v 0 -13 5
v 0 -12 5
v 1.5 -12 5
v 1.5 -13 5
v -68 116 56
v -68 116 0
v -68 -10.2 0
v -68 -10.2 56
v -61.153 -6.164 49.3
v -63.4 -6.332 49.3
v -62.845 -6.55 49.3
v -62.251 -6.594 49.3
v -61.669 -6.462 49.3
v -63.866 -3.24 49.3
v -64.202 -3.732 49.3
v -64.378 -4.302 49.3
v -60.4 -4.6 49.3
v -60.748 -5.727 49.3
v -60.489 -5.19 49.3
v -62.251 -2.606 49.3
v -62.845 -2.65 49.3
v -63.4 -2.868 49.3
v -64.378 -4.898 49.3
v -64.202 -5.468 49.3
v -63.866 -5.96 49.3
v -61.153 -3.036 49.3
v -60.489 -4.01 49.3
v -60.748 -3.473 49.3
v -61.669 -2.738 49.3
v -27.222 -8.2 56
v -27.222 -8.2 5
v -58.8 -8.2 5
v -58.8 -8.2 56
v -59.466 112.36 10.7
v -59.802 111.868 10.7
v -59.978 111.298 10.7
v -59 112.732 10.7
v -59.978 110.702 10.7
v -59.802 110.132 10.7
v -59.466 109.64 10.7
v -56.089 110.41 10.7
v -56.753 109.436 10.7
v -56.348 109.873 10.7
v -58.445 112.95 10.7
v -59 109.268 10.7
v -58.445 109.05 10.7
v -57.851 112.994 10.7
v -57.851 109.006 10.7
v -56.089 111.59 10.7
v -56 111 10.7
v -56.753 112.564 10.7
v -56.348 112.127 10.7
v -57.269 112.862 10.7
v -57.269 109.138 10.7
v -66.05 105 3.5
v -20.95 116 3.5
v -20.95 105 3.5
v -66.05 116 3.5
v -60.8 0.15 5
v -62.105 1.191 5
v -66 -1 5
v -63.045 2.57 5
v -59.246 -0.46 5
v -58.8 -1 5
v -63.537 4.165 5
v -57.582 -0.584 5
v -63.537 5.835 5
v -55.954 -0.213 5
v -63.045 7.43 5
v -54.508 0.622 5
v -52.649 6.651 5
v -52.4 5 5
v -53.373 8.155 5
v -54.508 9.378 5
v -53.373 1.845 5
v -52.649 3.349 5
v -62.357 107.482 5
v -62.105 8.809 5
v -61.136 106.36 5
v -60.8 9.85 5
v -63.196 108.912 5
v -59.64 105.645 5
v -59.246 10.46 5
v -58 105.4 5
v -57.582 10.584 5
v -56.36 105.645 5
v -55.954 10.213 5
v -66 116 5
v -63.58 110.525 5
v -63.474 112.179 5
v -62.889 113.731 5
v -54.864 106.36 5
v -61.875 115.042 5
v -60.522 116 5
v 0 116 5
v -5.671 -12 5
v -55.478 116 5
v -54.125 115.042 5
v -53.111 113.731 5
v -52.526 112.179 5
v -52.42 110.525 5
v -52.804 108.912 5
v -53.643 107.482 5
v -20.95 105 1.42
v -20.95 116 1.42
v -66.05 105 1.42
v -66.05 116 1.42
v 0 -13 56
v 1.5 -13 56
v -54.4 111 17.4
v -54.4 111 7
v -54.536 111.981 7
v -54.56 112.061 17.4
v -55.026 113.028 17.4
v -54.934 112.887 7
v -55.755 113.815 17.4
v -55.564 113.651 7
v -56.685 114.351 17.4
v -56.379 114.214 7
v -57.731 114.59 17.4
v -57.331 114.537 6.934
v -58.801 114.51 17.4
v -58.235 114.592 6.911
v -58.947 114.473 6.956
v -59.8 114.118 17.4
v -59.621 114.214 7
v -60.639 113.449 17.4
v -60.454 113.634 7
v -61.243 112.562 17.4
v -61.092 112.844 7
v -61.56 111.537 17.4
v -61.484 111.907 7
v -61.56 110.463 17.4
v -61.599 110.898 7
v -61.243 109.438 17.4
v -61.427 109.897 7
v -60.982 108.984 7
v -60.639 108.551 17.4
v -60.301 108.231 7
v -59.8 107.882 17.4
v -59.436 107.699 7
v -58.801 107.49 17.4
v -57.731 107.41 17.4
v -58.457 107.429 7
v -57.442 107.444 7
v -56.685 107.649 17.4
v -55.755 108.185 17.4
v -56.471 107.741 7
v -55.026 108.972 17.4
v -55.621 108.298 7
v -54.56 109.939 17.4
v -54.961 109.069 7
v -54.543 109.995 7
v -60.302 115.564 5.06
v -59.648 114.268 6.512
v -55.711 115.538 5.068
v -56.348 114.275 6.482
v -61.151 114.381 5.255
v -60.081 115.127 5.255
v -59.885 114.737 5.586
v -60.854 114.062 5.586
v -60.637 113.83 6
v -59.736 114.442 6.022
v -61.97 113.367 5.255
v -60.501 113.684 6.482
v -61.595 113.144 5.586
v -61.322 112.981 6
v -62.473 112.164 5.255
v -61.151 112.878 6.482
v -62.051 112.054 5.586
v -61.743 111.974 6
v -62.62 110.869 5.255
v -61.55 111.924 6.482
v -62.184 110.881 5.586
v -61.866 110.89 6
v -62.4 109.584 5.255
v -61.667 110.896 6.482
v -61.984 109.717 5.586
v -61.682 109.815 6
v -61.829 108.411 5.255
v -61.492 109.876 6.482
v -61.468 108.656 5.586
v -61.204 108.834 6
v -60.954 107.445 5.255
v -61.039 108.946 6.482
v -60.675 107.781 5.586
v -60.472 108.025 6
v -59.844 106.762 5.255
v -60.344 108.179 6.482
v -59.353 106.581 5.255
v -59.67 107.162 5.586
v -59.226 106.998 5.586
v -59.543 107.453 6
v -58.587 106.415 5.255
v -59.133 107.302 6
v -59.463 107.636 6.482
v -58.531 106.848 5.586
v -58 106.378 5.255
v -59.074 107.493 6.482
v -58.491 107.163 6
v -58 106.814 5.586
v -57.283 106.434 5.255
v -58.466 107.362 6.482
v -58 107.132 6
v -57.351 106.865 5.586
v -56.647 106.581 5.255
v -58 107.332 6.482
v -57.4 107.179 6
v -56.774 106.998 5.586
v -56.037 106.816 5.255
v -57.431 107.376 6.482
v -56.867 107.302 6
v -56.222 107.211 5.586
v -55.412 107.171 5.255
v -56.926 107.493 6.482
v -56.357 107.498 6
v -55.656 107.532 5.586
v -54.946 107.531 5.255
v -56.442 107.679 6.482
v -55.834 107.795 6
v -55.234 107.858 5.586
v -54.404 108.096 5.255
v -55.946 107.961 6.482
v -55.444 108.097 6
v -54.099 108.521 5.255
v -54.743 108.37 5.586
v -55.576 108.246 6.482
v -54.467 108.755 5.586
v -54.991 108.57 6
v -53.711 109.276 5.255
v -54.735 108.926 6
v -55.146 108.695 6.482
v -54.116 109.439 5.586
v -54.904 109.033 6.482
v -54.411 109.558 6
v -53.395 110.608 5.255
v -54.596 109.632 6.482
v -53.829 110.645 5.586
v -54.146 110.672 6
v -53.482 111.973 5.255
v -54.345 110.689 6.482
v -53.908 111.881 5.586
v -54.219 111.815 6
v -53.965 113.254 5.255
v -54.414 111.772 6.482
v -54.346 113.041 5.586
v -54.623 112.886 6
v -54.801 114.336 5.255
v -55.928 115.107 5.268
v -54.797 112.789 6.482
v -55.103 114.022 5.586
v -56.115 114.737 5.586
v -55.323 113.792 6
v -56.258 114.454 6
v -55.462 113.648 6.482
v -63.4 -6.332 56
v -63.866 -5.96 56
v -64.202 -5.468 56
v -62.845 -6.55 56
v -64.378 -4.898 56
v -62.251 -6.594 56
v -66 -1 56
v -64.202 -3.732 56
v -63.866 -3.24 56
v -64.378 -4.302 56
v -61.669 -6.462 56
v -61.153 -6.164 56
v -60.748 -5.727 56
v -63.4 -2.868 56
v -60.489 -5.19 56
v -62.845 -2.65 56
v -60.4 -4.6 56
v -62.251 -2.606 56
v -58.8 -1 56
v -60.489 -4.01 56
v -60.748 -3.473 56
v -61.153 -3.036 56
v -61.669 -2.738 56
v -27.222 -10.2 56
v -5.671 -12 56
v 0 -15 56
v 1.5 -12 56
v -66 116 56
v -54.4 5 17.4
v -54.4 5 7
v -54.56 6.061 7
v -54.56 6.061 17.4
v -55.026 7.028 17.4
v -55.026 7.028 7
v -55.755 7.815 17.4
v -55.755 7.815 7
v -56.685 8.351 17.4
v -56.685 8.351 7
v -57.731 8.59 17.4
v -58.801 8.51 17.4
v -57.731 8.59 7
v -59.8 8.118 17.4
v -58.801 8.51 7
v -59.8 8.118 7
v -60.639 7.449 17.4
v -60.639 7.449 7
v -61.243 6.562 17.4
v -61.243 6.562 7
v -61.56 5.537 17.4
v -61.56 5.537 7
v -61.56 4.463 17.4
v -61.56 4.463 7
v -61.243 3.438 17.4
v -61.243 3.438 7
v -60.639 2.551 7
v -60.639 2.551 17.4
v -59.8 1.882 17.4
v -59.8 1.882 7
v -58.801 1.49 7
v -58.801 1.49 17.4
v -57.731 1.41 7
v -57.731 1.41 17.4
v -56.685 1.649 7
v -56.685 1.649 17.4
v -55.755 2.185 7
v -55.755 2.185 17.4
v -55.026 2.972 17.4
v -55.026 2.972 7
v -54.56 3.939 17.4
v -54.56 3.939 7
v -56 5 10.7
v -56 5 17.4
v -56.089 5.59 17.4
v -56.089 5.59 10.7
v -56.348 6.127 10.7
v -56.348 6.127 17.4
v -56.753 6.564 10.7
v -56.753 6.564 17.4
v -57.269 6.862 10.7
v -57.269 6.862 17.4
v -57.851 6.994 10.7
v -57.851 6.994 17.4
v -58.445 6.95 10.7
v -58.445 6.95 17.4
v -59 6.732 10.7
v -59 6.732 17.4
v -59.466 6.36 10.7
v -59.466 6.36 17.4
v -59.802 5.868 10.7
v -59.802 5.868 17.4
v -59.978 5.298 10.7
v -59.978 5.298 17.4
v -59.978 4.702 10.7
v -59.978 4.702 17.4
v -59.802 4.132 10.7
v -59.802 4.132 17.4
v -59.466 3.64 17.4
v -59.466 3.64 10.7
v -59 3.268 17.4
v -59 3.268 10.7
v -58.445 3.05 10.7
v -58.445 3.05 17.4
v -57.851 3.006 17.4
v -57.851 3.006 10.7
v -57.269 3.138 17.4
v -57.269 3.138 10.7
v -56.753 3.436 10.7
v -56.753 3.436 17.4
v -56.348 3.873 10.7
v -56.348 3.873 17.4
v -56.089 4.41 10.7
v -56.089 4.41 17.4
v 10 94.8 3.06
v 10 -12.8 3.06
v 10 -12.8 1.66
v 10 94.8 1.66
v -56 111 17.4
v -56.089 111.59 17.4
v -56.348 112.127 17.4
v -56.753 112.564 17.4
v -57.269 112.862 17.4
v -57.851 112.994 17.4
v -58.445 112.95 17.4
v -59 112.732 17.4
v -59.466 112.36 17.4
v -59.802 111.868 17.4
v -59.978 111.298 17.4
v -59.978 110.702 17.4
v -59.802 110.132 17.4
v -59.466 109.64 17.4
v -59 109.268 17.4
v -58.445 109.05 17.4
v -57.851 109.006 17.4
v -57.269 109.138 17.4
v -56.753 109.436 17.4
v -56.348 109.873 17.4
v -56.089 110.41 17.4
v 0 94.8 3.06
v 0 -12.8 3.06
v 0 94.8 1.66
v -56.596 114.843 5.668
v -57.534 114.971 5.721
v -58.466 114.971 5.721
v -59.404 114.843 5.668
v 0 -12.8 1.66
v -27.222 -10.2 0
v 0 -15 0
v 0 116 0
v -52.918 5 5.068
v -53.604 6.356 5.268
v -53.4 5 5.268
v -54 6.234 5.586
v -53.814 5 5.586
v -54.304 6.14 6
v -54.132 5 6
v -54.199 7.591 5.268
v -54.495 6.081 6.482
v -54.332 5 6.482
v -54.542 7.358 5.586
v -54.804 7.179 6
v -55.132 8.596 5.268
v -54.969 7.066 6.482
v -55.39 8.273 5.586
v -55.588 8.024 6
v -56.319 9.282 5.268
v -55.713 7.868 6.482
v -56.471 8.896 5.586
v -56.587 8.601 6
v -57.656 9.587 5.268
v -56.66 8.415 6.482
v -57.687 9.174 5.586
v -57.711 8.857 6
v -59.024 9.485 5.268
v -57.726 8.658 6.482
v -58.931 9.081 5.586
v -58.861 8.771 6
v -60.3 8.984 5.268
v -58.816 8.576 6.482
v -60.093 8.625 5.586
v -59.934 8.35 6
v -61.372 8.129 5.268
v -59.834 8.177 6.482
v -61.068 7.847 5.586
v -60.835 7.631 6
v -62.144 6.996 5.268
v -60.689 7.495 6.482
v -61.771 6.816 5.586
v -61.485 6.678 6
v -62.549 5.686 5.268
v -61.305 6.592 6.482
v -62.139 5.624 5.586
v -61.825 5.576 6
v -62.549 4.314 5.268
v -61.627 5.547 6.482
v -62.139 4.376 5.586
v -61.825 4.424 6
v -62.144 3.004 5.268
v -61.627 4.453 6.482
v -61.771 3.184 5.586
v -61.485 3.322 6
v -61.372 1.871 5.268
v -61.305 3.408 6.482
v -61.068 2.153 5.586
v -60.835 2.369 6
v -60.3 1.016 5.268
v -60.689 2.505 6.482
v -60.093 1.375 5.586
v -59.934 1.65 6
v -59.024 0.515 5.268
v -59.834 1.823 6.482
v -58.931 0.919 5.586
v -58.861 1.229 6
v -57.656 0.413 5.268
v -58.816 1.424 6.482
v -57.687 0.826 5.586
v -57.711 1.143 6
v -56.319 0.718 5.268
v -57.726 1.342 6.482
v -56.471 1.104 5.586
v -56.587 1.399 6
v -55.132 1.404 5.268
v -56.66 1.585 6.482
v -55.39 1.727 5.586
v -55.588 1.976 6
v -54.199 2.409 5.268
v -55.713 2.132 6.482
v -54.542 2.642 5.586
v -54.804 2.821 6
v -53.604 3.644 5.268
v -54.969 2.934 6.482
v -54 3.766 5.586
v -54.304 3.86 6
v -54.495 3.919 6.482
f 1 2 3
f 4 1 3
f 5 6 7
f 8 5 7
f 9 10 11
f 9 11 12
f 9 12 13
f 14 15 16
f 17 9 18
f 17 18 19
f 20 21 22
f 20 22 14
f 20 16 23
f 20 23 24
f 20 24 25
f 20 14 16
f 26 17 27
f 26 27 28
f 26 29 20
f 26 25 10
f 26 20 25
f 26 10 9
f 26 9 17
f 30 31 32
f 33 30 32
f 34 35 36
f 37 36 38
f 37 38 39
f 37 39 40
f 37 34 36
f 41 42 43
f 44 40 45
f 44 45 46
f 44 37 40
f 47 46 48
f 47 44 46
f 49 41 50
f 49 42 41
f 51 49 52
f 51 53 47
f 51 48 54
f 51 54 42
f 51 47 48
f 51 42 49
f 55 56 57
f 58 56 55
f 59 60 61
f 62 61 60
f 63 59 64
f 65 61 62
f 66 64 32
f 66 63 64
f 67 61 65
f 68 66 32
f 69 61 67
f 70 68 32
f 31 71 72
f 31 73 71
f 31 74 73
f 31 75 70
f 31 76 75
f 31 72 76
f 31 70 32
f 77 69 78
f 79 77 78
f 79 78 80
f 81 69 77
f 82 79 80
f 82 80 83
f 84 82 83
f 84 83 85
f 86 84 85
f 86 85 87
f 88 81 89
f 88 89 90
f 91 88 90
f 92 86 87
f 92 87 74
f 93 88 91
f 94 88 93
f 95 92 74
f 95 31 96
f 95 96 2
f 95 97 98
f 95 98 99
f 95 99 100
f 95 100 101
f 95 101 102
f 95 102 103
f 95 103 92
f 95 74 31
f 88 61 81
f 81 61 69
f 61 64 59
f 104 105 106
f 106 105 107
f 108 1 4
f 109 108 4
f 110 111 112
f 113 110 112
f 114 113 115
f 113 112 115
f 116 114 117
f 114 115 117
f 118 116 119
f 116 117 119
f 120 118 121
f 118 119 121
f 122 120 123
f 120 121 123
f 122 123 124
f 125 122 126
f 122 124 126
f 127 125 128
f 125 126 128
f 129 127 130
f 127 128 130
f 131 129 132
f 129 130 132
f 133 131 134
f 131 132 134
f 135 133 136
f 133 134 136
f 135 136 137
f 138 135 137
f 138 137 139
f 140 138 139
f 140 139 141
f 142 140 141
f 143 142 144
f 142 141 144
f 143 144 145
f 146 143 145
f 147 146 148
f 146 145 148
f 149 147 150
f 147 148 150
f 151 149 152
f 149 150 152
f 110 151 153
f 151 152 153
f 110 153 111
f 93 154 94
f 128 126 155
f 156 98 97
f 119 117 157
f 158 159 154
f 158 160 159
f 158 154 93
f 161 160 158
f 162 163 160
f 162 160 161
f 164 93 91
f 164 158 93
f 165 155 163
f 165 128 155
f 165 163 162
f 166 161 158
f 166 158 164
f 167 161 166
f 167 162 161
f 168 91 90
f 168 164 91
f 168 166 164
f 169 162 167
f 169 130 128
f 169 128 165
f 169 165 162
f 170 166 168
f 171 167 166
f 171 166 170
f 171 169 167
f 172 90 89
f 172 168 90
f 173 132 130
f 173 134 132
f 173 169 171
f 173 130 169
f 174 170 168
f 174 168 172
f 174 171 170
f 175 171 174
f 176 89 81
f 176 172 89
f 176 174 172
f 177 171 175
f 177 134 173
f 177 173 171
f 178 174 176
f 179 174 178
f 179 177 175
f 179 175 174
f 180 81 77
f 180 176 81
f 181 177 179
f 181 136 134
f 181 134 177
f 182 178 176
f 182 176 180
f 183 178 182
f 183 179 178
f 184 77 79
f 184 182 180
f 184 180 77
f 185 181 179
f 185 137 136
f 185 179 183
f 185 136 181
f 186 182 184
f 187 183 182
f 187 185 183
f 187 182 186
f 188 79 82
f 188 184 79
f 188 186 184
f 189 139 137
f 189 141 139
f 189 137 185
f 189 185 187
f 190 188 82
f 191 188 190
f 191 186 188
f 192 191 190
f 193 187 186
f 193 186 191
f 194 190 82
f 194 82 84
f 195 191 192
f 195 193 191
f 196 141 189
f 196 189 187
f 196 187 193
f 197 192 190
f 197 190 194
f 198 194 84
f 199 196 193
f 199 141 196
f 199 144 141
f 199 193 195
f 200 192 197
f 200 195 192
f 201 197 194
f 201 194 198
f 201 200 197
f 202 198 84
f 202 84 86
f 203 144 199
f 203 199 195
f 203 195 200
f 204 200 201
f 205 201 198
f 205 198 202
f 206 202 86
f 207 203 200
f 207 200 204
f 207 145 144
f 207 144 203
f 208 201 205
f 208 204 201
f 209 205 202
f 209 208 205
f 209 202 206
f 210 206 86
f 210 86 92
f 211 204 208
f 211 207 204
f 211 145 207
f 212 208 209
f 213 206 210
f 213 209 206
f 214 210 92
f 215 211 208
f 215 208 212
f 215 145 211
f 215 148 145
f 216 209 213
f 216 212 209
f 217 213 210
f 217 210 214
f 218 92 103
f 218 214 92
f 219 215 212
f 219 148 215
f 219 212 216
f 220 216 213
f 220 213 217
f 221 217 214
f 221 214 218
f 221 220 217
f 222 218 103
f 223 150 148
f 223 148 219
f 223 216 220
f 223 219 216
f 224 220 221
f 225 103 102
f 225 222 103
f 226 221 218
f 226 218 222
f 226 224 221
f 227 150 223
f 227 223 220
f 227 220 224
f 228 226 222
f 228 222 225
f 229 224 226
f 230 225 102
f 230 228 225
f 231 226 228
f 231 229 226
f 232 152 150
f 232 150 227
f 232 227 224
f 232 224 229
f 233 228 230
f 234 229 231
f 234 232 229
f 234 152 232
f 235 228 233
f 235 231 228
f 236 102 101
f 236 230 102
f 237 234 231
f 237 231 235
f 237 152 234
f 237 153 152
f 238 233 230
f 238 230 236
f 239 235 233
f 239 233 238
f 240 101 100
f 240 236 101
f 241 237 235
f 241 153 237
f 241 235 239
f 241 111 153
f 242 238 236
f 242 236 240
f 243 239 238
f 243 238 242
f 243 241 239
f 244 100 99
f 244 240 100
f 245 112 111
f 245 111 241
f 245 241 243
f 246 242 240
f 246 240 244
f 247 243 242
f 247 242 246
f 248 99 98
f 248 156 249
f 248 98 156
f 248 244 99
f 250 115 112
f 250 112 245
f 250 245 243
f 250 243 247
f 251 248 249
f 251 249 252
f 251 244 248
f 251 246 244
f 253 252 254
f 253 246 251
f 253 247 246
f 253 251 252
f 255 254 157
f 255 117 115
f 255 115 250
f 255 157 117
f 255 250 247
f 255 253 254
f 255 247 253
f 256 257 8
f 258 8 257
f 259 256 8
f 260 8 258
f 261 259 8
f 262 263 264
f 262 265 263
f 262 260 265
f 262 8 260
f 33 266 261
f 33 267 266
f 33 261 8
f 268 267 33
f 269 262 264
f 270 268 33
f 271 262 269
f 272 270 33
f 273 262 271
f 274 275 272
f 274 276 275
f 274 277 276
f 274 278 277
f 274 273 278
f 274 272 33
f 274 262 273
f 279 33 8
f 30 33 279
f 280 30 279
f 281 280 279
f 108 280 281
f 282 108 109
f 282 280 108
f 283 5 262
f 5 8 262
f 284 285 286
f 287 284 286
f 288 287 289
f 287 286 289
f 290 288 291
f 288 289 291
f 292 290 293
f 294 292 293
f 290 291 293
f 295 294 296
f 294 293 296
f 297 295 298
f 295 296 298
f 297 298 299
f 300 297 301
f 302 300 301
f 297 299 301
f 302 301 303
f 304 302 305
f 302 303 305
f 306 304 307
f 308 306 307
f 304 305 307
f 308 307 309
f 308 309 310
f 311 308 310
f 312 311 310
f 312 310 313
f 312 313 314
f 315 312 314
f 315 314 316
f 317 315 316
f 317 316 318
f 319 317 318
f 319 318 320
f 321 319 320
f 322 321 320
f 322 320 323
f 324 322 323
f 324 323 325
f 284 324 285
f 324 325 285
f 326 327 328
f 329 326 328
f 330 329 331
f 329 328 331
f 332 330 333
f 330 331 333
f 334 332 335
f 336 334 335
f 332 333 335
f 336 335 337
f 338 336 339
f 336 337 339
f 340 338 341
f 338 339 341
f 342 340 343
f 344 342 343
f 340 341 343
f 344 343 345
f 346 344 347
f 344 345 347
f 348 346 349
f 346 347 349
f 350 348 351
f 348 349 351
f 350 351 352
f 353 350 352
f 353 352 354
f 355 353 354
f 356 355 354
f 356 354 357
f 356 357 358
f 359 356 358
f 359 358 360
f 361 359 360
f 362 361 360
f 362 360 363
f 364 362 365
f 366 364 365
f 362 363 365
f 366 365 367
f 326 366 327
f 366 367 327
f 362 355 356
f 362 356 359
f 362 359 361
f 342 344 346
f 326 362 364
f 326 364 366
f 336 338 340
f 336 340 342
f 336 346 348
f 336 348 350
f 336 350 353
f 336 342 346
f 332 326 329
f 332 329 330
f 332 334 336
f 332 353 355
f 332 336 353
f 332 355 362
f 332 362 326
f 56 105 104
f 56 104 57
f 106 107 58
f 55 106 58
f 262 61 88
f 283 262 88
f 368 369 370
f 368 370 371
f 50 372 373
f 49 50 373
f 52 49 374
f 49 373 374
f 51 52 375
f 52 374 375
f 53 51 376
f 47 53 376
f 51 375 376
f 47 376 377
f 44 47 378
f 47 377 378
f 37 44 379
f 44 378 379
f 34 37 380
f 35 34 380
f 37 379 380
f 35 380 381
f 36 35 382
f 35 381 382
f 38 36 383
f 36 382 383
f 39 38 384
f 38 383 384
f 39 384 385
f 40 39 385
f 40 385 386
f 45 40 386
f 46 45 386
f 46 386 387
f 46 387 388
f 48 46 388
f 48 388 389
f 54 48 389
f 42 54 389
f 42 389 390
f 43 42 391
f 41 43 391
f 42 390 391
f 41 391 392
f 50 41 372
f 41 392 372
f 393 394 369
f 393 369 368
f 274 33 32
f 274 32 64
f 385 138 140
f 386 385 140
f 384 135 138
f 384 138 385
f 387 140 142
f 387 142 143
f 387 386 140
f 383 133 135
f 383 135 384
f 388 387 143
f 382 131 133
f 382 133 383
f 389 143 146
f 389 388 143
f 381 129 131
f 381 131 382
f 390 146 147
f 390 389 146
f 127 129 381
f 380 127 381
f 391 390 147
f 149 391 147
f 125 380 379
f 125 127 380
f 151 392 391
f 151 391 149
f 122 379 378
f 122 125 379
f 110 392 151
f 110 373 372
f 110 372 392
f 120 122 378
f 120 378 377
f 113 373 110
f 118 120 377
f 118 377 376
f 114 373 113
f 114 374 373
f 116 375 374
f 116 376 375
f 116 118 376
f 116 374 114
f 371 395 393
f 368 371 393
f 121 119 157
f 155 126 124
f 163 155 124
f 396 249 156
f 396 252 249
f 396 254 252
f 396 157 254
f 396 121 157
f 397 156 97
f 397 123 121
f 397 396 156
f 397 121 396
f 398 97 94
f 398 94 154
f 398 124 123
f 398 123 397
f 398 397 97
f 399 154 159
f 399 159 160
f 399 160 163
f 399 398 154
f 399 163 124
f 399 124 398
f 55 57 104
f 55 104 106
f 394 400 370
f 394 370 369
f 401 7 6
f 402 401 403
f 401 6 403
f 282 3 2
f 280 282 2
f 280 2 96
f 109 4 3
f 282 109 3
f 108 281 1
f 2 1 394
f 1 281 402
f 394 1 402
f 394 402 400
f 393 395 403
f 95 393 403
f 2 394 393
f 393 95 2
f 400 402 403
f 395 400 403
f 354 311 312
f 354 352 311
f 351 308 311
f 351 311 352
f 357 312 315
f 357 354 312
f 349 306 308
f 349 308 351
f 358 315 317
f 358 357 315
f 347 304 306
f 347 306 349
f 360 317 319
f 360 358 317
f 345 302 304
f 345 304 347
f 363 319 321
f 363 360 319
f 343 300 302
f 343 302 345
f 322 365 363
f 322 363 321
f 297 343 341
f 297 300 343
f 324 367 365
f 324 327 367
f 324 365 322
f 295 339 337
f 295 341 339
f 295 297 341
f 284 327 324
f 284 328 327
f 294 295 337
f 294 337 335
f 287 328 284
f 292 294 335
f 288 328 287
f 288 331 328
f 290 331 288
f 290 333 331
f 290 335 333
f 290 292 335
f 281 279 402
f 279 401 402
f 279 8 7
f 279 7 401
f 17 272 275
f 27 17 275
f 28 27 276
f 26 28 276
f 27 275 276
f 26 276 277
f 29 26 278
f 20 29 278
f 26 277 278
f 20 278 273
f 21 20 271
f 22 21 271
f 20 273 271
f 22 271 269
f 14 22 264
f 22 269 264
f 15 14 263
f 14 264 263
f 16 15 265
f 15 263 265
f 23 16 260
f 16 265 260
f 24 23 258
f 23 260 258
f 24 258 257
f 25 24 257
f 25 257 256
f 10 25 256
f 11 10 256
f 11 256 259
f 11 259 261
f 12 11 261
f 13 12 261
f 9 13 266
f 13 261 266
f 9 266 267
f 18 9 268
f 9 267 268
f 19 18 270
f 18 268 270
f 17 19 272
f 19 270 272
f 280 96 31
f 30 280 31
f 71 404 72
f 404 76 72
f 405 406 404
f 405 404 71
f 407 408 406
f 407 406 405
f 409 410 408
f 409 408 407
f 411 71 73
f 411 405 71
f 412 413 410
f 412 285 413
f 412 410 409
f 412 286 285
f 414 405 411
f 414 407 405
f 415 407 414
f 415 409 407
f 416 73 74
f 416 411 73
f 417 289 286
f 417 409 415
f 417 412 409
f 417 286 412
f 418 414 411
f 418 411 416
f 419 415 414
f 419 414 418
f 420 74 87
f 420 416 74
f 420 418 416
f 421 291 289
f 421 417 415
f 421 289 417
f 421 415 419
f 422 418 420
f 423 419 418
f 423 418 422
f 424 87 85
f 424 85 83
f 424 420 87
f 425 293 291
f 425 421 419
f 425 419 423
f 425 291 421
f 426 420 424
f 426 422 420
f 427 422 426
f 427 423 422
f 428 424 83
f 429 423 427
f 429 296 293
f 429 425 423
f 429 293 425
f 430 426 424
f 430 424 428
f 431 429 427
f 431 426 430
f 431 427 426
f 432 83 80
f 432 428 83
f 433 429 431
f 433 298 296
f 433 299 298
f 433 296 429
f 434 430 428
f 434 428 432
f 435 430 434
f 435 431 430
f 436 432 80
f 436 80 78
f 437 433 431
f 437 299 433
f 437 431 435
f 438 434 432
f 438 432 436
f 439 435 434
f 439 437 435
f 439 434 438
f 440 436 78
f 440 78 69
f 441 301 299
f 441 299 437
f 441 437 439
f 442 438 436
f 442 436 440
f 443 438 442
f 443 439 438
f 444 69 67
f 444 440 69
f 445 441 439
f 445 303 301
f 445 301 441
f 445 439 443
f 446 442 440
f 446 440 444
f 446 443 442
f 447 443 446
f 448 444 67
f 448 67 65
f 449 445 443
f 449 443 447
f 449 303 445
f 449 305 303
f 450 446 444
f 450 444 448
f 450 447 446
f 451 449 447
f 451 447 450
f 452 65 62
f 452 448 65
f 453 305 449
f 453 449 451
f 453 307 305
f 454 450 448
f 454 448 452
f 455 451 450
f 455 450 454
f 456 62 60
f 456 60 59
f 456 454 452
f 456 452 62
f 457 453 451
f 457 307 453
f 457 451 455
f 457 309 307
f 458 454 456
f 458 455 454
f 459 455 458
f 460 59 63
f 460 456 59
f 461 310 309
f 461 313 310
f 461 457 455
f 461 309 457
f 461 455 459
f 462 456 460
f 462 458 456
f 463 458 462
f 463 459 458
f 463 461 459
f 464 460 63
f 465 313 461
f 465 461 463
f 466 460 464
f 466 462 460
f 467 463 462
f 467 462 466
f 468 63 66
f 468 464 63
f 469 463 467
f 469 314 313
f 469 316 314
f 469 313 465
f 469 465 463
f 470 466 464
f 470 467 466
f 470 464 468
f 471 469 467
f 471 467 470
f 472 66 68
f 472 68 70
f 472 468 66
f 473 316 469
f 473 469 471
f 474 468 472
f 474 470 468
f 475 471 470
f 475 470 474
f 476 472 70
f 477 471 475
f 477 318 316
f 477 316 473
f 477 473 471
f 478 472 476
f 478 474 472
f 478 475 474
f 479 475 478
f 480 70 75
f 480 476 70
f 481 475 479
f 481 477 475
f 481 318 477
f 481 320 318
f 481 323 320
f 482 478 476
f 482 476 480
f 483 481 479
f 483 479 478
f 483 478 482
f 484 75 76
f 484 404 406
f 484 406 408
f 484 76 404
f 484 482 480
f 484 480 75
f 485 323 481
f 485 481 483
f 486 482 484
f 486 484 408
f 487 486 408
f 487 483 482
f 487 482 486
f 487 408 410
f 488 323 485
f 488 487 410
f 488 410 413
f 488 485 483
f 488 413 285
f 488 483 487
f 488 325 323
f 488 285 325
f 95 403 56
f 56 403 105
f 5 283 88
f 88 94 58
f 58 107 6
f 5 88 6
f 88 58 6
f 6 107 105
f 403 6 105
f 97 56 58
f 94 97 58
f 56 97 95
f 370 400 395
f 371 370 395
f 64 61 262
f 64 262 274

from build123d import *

# Parameters (mm, degrees)
SKETCH_1_W      = 63
SKETCH_1_H      = 116
PAD_DEPTH       = 5
PAD001_DEPTH    = 5
SKETCH001_W     = 5
SKETCH001_H     = 126.2
PAD002_DEPTH    = 5
PAD003_DEPTH    = 51
SKETCH003_W     = 7.2
SKETCH003_H     = 7.2
PAD004_DEPTH    = 51
SKETCH004_R     = 2
POCKET_DEPTH    = 6.7
SKETCH005_W     = 107.6
SKETCH005_H     = 1.4
PAD005_DEPTH    = 10
SKETCH006_R     = 3.6
PAD006_DEPTH    = 12.4
SKETCH007_R     = 2
POCKET001_DEPTH = 6.7
SKETCH008_W     = 45.1
SKETCH008_H     = 2.08
POCKET002_DEPTH = 11
PAD007_DEPTH    = 51
FILLET_R        = 2


with BuildPart() as part:
    # Sketch_1 → Pad (new body)
    with BuildSketch(Plane.XY):
        with Locations((-31.5, 58)):
            Rectangle(SKETCH_1_W, SKETCH_1_H)
    extrude(amount=PAD_DEPTH)

    # Sketch → Pad001 (join)
    with BuildSketch(Plane.XY):
        Polygon((0, 0), (-63, 0), (-63, -10.2), (-27.222153, -10.2), (0, -15), align=None)
    extrude(amount=PAD001_DEPTH)

    # Sketch001 → Pad002 (join)
    with BuildSketch(Plane.XY):
        with Locations((-65.5, 52.9)):
            Rectangle(SKETCH001_W, SKETCH001_H)
    extrude(amount=PAD002_DEPTH)

    # Sketch002 (on Face8 of Pad002) → Pad003 (join)
    with BuildSketch(Plane.XY.offset(5)):
        Polygon((-68, 116), (-68, -10.2), (-27.222153, -10.2), (0, -15), (0, -13), (-27.222153, -8.2), (-66, -8.2), (-66, 116), align=None)
    extrude(amount=PAD003_DEPTH)

    # Sketch003 (on Face8 of Pad003) → Pad004 (join)
    with BuildSketch(Plane.XY.offset(5)):
        with Locations((-62.4, -4.6)):
            Rectangle(SKETCH003_W, SKETCH003_H)
    extrude(amount=PAD004_DEPTH)

    # Sketch004 (on Face25 of Pad004) → Pocket (cut)
    with BuildSketch(Plane.XY.offset(56)):
        with Locations((-62.4, -4.6)):
            Circle(SKETCH004_R)
    extrude(amount=-POCKET_DEPTH, mode=Mode.SUBTRACT)

    # Sketch005 (on Face3 of Pocket) → Pad005 (join)
    with BuildSketch(Plane.YZ):
        with Locations((41, 2.36)):
            Rectangle(SKETCH005_W, SKETCH005_H)
    extrude(amount=PAD005_DEPTH)

    # Sketch006 (on Face5 of Pad005) → Pad006 (join)
    with BuildSketch(Plane.XY.offset(5)):
        with Locations((-58, 5)):
            Circle(SKETCH006_R)
        with Locations((-58, 111)):
            Circle(SKETCH006_R)
    extrude(amount=PAD006_DEPTH)

    # Sketch007 (on Face31 of Pad006) → Pocket001 (cut)
    with BuildSketch(Plane.XY.offset(17.4)):
        with Locations((-58, 5)):
            Circle(SKETCH007_R)
        with Locations((-58, 111)):
            Circle(SKETCH007_R)
    extrude(amount=-POCKET001_DEPTH, mode=Mode.SUBTRACT)

    # Sketch008 (on Face1 of Pocket001) → Pocket002 (cut)
    with BuildSketch(Plane(origin=(0, 116, 0), x_dir=(-1, 0, 0), z_dir=(0, 1, 0))):
        with Locations((43.5, 2.46)):
            Rectangle(SKETCH008_W, SKETCH008_H)
    extrude(amount=-POCKET002_DEPTH, mode=Mode.SUBTRACT)

    # Sketch009 (on Face15 of Pocket002) → Pad007 (join)
    with BuildSketch(Plane.XY.offset(5)):
        Polygon((0, -12), (-5.671282, -12), (0, -13), (1.5, -13), (1.5, -12), align=None)
    extrude(amount=PAD007_DEPTH)

    # Fillet
    fillet_edges = [part.edges().sort_by_distance(p)[0] for p in [
        (-61.6, 111, 5),
        (-61.6, 5, 5),
    ]]
    fillet(fillet_edges, radius=FILLET_R)


solid = part.part
